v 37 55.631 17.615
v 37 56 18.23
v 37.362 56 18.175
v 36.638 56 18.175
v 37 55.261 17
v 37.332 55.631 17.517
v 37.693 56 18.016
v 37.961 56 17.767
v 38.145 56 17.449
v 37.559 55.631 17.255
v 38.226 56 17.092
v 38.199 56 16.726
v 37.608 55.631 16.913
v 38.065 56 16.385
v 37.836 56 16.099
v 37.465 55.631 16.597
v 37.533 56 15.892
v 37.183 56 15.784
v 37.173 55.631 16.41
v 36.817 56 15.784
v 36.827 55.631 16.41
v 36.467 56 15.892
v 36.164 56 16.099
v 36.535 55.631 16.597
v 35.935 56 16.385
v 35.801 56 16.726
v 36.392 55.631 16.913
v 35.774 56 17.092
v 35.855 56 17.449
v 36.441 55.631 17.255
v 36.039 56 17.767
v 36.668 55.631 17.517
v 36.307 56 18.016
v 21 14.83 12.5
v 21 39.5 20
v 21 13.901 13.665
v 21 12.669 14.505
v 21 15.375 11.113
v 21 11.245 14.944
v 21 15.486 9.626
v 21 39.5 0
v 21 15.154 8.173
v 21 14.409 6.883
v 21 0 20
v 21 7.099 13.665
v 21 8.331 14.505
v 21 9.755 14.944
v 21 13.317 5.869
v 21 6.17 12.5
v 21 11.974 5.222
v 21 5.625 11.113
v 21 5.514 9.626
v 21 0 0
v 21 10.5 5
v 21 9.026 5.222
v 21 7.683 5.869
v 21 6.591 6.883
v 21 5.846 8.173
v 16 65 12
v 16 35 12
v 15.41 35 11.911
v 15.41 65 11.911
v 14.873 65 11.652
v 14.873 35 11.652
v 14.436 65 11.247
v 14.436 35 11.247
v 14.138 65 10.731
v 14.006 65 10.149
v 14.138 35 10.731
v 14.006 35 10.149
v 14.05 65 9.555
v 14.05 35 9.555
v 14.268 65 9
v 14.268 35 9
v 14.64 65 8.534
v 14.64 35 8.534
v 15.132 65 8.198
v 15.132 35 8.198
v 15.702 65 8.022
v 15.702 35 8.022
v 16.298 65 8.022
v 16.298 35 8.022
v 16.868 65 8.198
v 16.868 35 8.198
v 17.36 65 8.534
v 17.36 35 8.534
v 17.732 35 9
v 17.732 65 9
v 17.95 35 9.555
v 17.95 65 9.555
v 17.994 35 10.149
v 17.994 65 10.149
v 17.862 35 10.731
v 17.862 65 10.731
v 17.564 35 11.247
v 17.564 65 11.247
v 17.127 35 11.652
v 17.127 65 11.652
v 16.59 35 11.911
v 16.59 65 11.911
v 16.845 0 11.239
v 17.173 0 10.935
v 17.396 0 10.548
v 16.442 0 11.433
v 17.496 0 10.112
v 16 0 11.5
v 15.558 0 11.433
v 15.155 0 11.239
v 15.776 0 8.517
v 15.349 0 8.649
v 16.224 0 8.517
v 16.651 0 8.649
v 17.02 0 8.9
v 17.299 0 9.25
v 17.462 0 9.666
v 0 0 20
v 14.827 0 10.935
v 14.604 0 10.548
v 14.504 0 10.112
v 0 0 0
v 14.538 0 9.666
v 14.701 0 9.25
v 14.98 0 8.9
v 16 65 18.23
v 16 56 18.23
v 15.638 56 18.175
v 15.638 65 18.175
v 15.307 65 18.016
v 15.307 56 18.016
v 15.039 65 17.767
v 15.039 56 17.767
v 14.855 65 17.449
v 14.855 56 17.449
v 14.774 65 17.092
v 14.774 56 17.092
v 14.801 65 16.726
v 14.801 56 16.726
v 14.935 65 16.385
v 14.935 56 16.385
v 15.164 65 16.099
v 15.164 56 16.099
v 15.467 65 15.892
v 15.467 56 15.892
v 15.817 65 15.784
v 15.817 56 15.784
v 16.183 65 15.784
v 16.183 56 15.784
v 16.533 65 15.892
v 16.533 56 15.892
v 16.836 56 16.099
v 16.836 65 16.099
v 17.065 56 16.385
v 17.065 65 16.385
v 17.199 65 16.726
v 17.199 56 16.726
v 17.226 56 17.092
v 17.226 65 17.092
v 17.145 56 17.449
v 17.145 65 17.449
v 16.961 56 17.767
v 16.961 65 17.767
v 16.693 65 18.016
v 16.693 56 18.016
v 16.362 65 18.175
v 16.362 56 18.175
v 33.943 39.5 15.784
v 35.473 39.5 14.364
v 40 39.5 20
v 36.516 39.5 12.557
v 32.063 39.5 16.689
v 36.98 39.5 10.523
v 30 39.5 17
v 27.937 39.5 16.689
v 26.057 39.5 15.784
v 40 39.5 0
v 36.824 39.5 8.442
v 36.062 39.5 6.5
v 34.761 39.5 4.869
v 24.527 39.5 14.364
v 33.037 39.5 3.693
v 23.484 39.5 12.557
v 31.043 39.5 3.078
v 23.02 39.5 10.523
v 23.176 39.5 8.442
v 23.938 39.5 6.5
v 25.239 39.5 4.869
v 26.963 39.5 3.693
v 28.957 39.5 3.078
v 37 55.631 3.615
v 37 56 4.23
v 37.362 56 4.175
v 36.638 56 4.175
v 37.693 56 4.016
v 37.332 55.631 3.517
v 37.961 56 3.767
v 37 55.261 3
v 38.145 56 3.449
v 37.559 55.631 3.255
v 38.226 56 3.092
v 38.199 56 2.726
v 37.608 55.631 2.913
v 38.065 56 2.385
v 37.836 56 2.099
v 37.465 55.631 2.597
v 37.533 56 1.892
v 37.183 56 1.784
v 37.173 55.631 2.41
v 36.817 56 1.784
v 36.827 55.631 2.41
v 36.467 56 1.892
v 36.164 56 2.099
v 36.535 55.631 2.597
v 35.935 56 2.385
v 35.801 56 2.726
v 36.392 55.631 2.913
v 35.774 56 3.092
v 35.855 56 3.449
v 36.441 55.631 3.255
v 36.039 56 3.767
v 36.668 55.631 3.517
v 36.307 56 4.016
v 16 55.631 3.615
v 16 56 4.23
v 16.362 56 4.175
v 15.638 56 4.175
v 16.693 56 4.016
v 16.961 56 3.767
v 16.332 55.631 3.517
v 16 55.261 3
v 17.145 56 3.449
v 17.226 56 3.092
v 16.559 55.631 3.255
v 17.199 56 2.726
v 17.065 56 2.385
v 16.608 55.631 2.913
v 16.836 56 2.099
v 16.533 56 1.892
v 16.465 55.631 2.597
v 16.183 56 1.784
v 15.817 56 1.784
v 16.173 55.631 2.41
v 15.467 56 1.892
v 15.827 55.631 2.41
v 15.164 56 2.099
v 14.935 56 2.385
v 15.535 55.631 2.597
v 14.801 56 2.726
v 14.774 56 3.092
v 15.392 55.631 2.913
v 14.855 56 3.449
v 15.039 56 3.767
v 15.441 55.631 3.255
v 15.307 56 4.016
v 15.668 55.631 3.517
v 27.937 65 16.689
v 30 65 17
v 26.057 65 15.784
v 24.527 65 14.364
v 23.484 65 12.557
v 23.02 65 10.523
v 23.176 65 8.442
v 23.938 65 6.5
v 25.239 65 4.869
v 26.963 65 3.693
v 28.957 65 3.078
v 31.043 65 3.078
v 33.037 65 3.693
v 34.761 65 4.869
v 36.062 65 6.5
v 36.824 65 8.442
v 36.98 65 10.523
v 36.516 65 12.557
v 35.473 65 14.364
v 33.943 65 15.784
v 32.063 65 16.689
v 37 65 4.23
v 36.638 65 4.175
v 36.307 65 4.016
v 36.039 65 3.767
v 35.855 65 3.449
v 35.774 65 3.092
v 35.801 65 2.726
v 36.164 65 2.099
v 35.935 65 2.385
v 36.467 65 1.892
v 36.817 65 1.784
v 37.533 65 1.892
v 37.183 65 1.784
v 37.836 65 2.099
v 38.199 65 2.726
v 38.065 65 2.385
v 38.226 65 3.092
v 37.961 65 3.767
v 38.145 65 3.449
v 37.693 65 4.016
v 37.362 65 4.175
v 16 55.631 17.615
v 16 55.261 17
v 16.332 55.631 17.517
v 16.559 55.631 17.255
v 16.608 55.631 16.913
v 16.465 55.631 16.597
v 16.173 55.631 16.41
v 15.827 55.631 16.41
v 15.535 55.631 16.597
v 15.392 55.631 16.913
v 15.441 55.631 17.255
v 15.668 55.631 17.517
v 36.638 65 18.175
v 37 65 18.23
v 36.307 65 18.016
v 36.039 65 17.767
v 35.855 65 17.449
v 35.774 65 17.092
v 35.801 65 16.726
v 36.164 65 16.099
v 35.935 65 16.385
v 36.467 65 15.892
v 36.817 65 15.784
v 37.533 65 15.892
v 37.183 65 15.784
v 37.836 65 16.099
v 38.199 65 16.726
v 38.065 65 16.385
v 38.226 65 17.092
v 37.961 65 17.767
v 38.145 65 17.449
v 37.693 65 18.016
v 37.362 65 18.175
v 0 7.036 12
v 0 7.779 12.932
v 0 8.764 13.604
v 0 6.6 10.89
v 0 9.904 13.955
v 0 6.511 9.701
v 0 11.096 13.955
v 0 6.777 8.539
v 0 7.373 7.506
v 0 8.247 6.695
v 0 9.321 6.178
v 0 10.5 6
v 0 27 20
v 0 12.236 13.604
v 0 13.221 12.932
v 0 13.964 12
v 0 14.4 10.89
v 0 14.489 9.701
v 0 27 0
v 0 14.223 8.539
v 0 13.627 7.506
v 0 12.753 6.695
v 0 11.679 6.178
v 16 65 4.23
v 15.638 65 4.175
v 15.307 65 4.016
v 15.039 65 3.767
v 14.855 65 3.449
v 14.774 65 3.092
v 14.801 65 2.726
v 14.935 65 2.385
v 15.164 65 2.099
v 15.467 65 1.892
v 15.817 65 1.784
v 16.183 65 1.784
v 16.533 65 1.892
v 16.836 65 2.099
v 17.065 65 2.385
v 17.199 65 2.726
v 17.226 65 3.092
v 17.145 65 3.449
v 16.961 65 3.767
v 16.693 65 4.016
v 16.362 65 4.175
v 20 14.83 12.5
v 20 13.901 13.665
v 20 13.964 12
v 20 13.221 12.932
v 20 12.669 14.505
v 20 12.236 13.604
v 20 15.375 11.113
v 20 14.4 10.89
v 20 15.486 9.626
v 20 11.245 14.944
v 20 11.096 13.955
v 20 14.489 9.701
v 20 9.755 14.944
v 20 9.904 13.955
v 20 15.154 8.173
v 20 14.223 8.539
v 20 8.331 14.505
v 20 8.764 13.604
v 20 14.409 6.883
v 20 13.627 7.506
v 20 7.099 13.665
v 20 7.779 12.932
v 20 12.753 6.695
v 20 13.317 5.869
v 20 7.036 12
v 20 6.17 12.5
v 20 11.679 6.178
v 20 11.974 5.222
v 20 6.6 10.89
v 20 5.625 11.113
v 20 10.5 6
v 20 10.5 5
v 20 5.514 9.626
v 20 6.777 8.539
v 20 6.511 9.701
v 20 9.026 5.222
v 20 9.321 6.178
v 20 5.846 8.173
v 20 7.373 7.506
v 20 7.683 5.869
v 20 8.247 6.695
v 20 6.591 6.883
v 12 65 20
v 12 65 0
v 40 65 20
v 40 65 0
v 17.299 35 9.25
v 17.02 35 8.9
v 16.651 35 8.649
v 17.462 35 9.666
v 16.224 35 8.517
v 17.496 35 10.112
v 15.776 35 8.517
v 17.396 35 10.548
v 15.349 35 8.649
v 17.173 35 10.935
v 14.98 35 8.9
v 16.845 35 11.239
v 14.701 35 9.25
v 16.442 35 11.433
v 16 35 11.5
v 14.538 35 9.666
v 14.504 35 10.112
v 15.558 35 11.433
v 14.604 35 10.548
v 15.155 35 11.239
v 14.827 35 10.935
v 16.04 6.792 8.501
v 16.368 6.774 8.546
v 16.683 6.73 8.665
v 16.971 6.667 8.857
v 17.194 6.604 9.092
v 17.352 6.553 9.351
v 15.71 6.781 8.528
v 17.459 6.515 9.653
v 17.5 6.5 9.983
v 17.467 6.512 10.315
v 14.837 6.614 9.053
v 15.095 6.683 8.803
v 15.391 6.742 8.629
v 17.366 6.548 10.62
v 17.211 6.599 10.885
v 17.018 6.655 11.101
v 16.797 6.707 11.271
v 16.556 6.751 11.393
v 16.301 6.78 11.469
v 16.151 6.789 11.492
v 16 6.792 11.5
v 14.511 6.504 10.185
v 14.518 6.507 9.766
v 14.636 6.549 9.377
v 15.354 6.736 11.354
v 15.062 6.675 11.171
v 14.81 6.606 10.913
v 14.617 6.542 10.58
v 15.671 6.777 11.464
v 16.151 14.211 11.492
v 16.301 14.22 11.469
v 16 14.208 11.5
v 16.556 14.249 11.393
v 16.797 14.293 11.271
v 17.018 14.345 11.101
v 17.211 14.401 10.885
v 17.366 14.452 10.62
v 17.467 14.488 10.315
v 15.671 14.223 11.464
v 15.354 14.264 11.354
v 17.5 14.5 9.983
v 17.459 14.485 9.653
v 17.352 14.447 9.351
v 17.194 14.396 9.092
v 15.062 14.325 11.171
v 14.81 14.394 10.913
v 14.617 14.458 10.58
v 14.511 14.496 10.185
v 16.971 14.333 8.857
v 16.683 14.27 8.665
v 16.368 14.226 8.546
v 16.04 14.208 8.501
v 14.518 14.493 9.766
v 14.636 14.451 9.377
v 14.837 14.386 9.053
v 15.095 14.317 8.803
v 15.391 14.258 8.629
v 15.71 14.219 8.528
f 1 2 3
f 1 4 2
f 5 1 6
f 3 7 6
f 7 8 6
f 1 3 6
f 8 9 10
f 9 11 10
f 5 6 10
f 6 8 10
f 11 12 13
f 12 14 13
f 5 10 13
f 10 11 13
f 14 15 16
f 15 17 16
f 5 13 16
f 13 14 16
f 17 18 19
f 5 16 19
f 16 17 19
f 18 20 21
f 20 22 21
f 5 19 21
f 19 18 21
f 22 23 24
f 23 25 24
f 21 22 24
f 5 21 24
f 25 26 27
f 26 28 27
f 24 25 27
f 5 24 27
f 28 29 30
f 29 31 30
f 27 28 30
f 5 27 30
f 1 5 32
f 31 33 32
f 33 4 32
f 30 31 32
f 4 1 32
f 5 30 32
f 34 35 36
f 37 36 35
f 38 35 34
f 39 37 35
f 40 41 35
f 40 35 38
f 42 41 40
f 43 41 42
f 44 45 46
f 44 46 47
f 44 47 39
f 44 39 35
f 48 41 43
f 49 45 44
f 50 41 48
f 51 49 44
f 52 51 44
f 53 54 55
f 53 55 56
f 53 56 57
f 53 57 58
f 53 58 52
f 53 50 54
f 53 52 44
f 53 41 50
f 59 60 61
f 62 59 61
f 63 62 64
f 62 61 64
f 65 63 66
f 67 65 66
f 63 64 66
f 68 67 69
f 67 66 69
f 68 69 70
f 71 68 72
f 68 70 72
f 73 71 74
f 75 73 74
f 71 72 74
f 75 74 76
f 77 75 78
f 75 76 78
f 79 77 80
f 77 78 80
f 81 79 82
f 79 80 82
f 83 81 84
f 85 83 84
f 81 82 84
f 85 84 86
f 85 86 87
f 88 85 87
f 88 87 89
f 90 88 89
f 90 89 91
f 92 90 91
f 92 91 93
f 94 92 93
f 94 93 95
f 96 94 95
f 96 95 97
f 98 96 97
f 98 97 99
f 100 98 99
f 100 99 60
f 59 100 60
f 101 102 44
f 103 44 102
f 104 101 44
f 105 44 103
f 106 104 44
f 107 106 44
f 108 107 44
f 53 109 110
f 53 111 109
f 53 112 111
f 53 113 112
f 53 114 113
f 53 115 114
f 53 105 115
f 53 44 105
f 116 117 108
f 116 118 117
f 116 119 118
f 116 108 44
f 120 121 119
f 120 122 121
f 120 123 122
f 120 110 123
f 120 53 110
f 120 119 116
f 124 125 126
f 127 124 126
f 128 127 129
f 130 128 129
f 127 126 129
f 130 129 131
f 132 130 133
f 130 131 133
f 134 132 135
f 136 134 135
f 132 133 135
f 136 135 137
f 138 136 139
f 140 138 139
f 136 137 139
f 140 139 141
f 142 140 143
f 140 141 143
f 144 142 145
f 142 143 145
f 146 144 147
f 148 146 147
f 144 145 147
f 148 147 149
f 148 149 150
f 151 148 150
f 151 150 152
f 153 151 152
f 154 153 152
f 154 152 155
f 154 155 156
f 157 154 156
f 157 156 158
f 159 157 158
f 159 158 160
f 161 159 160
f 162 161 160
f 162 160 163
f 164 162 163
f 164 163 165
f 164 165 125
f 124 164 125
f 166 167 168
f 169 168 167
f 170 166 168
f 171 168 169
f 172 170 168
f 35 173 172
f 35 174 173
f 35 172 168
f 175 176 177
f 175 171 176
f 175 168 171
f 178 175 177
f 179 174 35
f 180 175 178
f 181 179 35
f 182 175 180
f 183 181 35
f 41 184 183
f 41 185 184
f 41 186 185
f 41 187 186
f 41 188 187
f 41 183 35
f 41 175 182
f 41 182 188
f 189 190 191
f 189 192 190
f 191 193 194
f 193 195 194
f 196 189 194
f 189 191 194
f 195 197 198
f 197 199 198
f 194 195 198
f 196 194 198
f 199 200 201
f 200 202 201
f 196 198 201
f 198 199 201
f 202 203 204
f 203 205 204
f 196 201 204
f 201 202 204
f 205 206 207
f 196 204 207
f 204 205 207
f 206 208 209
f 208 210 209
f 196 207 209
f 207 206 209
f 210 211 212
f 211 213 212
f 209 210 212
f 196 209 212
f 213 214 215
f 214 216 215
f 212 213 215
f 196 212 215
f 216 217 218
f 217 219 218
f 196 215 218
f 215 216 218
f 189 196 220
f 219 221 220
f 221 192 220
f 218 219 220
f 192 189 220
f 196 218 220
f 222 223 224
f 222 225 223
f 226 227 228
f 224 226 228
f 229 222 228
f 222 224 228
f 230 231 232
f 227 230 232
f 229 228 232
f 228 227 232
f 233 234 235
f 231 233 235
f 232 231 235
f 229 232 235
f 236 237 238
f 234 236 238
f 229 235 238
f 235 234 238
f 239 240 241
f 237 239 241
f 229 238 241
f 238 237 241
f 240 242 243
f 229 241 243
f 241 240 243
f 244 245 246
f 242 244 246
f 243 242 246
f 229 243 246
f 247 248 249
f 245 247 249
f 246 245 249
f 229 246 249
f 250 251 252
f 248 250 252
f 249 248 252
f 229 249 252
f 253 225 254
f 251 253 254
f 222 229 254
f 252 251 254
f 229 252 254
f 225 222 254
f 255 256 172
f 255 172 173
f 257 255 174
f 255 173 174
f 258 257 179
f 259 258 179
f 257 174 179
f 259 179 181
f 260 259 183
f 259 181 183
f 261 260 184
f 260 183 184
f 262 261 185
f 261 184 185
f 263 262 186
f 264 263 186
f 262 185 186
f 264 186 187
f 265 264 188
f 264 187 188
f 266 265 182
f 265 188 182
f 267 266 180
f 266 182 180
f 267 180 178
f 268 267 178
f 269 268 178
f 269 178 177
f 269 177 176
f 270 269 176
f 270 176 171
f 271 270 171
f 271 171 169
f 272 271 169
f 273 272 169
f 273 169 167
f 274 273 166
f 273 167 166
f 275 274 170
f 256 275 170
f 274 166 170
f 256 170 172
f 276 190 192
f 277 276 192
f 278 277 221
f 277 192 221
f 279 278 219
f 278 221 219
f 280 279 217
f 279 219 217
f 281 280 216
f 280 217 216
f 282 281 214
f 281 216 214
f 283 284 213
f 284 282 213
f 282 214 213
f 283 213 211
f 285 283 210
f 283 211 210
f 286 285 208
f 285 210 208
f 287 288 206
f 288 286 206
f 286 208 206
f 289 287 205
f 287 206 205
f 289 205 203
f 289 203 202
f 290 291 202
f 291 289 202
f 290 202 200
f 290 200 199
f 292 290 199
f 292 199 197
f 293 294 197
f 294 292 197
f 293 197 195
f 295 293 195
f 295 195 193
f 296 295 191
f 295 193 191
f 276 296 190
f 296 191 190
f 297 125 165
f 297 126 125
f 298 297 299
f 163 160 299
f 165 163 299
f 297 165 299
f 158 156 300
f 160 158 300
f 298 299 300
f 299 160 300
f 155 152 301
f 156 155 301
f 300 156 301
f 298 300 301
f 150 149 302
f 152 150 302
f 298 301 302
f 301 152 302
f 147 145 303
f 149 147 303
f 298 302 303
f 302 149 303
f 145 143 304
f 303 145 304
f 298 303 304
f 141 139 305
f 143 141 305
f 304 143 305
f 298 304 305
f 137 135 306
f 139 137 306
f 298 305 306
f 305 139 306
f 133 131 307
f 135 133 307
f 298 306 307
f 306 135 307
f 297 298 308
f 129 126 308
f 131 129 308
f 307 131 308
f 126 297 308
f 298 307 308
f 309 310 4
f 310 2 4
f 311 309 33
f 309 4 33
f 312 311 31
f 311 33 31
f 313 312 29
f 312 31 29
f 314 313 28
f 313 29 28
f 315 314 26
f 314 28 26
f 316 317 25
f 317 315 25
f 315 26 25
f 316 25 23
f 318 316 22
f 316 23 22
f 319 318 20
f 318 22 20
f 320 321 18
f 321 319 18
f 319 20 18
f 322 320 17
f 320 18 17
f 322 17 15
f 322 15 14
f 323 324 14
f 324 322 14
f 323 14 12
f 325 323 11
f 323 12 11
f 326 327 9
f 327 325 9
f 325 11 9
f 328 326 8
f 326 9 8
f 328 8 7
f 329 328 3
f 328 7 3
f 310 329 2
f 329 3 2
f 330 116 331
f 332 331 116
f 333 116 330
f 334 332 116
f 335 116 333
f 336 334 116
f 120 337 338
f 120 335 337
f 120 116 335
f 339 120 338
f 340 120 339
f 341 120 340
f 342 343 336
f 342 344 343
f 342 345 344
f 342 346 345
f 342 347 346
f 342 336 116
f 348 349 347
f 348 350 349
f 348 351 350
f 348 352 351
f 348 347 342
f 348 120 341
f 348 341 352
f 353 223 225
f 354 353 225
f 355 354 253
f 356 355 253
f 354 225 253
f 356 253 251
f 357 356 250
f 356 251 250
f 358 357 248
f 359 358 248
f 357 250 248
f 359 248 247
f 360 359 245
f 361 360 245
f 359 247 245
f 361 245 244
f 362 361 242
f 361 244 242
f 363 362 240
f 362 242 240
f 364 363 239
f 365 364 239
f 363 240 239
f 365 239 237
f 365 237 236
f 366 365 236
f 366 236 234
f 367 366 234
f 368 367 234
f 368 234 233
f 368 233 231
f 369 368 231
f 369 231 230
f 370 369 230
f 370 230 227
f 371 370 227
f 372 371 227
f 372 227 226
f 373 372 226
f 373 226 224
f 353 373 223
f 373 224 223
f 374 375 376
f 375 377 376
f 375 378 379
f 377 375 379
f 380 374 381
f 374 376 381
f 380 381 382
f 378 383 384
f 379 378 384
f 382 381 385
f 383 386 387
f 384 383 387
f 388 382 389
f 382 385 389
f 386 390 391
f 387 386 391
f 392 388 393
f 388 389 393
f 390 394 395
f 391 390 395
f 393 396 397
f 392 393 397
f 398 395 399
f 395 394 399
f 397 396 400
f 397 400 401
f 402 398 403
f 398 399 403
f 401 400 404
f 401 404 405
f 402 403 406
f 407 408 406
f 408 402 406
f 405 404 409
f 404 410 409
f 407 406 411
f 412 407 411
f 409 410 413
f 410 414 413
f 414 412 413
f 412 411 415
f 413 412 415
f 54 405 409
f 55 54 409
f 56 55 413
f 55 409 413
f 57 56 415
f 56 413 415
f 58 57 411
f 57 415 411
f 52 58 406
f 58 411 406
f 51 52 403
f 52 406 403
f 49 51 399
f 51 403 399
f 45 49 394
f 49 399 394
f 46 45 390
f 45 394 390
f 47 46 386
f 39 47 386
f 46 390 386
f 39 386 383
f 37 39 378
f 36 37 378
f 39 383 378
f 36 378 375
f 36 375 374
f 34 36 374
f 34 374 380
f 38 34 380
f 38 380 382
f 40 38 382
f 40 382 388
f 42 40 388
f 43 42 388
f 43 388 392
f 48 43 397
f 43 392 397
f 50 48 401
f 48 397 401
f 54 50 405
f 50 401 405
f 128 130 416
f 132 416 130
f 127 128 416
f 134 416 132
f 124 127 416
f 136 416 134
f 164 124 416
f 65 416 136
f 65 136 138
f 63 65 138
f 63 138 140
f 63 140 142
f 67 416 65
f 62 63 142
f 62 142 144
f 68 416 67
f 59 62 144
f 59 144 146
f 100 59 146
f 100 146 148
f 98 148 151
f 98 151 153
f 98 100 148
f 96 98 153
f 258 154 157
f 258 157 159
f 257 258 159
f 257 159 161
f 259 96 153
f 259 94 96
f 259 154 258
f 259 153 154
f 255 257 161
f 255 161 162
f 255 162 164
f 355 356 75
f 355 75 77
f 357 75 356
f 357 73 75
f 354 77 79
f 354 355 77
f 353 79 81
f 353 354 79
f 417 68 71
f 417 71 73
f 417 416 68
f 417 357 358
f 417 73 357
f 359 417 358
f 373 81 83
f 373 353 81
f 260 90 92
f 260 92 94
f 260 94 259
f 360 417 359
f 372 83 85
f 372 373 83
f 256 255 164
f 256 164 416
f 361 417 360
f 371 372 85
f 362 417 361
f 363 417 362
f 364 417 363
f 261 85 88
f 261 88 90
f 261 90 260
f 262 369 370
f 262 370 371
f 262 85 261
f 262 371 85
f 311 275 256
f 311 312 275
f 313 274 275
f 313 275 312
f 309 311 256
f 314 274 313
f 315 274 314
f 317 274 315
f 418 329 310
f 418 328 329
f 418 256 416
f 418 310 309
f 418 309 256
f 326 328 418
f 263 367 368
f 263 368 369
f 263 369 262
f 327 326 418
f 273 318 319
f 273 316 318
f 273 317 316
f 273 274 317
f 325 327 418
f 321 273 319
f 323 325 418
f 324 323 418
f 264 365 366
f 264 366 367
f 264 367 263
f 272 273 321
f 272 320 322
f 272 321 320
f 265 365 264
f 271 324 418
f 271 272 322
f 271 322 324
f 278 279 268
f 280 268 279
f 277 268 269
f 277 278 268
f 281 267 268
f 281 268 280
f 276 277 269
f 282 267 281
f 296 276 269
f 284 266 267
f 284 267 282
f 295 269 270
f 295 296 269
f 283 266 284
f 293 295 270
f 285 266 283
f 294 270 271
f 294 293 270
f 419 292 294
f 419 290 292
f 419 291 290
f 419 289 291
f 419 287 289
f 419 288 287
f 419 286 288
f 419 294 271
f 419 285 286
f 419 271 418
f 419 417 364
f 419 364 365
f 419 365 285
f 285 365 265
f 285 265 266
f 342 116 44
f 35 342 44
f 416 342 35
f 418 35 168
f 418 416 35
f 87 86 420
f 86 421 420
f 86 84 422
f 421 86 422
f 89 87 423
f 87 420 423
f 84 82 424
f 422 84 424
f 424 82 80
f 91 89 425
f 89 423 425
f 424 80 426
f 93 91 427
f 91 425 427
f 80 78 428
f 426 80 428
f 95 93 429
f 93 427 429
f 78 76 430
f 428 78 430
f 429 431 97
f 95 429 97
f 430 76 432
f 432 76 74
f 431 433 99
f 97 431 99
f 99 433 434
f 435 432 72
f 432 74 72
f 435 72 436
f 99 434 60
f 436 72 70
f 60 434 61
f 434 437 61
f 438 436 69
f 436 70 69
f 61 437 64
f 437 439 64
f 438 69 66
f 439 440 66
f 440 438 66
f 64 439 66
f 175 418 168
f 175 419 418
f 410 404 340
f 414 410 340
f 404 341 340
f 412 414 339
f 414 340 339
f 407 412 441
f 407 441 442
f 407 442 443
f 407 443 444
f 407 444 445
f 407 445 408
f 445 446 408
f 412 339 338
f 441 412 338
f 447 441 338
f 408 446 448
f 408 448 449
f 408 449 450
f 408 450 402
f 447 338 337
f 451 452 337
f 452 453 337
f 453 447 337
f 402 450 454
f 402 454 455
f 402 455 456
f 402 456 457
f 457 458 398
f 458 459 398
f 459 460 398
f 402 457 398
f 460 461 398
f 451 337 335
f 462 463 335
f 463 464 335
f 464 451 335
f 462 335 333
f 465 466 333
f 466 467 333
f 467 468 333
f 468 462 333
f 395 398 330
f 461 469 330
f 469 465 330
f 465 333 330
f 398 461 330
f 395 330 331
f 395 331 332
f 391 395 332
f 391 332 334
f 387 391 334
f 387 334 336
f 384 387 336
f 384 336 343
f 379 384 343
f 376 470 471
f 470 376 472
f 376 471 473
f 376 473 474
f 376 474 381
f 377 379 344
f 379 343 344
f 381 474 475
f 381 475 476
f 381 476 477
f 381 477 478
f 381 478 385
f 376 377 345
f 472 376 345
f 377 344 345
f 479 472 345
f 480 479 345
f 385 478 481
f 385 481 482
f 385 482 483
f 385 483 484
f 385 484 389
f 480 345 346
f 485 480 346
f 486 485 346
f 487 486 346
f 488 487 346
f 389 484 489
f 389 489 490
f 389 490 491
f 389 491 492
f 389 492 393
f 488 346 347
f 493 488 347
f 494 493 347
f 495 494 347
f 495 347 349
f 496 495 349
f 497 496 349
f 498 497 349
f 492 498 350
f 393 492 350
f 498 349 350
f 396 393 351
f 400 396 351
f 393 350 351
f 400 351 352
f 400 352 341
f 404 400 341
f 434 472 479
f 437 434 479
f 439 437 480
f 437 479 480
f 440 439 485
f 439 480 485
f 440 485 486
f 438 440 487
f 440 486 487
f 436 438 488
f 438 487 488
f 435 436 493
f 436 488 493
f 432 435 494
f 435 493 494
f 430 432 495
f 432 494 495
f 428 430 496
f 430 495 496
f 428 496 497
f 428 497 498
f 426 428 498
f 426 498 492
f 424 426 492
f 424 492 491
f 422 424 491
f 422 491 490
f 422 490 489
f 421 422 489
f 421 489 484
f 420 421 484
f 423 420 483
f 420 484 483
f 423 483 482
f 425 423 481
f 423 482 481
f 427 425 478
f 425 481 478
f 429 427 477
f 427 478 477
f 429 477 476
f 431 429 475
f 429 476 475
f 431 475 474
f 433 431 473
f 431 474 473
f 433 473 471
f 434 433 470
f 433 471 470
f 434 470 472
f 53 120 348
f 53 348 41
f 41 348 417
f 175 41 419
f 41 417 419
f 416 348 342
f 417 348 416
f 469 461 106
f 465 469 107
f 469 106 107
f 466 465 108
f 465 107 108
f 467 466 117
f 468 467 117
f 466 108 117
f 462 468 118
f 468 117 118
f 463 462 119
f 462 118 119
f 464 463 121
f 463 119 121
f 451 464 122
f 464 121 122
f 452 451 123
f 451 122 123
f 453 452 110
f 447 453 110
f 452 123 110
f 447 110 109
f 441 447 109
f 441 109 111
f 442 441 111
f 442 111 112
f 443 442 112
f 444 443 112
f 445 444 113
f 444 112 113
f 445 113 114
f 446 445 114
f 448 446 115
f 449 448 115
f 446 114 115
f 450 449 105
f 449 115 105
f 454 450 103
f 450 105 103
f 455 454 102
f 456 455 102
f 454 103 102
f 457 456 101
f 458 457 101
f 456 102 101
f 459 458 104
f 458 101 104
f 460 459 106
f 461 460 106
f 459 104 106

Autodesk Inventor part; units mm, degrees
ref_plane "XY Plane" through (0, 0, 0) normal (0, 0, 1) x (1, 0, 0)
sketch "Skizze1" plane through (0, 0, 0) normal (0, 0, 1) x (1, 0, 0)
  line L0 (0, 0) -> (0, 27)
  line L1 (0, 27) -> (12, 65)
  line L2 (12, 65) -> (40, 65)
  line L3 (40, 65) -> (40, 39.5)
  line L4 (40, 39.5) -> (21, 39.5)
  line L5 (21, 39.5) -> (21, 0)
  line L6 (21, 0) -> (0, 0)
  dimension "d0" = 65
  dimension "d1" = 21
  dimension "d2" = 39.5
  dimension "d3" = 38
  dimension "d4" = 28
  dimension "d5" = 12
extrude "Extrusion1" add sketch "Skizze1" along normal blind 20
sketch "Skizze3" plane through (12, 65, 0) normal (0, 1, 0) x (1, 0, 0)
  line L0 (0, 0) -> (0, -20) projected
  line L1 (28, 0) -> (28, -20) projected
  point P0 (-12, 0)
  point P1 (18, -10)
  point P2 (28, -10)
  dimension "d16" = 10
hole "Bohrung2" at (30, 65, 10) direction (0, -1, 0) diameter 14 end through all
sketch "Skizze4" plane through (12, 65, 0) normal (0, 1, 0) x (1, 0, 0)
  line L0 (0, 0) -> (0, -20) projected
  line L1 (28, 0) -> (28, -20) projected
  point P0 (-12, 0)
  point P1 (4, -10)
  point P2 (28, -10)
  dimension "d24" = 4
hole "Bohrung3" at (16, 65, 10) direction (0, -1, 0) diameter 3 depth 65 counterbore diameter 4 counterbore depth 30
sketch "Skizze5" plane through (21, 0, 0) normal (1, 0, 0) x (0, 0, -1)
  line L0 (0, 0) -> (-20, 0) projected
  point P0 (-10, 10.5)
  point P1 (-10, 0)
  dimension "d32" = 10.5
hole "Bohrung4" at (21, 10.5, 10) direction (-1, 0, 0) diameter 8 depth 21 counterbore diameter 10 counterbore depth 1
ref_plane "Arbeitsebene1" through (0, 12, 0) normal (0, 1, 0) x (-1, 0, 0)
sketch "Skizze8" plane through (12, 65, 0) normal (0, 1, 0) x (1, 0, 0)
  circle A0 centre (4, -10) radius 2 projected
  circle A1 centre (18, -10) radius 7 projected
  line L0 (28, 0) -> (0, 0) projected
  line L1 (0, 0) -> (0, -20) projected
  line L2 (28, -20) -> (0, -20) projected
  line L3 (28, 0) -> (28, -20) projected
  line L4 (4, -10) -> (4, -3) construction
  line L5 (4, -10) -> (4, -17) construction
  line L6 (18, -10) -> (9, -10) construction
  line L7 (9, 0) -> (9, -20) projected
  point P0 (-12, 0)
  dimension "d57" = 14
hole "Bohrung7" at (16, 65, 17) at (16, 65, 3) direction (0, -1, 0) diameter 2.459 depth 9 tip angle 118 thread size "M3x0.5" class "6H" standard "ISO Metric profile"
ref_plane "Arbeitsebene2" through (26.5, 0, 0) normal (1, 0, 0) x (0, 1, 0)
mirror "Spiegeln2" about plane through (26.5, 0, 0) normal (1, 0, 0) of "Bohrung7"
properties part number "MotorBlock" material "Stahl, galvanisiert"
